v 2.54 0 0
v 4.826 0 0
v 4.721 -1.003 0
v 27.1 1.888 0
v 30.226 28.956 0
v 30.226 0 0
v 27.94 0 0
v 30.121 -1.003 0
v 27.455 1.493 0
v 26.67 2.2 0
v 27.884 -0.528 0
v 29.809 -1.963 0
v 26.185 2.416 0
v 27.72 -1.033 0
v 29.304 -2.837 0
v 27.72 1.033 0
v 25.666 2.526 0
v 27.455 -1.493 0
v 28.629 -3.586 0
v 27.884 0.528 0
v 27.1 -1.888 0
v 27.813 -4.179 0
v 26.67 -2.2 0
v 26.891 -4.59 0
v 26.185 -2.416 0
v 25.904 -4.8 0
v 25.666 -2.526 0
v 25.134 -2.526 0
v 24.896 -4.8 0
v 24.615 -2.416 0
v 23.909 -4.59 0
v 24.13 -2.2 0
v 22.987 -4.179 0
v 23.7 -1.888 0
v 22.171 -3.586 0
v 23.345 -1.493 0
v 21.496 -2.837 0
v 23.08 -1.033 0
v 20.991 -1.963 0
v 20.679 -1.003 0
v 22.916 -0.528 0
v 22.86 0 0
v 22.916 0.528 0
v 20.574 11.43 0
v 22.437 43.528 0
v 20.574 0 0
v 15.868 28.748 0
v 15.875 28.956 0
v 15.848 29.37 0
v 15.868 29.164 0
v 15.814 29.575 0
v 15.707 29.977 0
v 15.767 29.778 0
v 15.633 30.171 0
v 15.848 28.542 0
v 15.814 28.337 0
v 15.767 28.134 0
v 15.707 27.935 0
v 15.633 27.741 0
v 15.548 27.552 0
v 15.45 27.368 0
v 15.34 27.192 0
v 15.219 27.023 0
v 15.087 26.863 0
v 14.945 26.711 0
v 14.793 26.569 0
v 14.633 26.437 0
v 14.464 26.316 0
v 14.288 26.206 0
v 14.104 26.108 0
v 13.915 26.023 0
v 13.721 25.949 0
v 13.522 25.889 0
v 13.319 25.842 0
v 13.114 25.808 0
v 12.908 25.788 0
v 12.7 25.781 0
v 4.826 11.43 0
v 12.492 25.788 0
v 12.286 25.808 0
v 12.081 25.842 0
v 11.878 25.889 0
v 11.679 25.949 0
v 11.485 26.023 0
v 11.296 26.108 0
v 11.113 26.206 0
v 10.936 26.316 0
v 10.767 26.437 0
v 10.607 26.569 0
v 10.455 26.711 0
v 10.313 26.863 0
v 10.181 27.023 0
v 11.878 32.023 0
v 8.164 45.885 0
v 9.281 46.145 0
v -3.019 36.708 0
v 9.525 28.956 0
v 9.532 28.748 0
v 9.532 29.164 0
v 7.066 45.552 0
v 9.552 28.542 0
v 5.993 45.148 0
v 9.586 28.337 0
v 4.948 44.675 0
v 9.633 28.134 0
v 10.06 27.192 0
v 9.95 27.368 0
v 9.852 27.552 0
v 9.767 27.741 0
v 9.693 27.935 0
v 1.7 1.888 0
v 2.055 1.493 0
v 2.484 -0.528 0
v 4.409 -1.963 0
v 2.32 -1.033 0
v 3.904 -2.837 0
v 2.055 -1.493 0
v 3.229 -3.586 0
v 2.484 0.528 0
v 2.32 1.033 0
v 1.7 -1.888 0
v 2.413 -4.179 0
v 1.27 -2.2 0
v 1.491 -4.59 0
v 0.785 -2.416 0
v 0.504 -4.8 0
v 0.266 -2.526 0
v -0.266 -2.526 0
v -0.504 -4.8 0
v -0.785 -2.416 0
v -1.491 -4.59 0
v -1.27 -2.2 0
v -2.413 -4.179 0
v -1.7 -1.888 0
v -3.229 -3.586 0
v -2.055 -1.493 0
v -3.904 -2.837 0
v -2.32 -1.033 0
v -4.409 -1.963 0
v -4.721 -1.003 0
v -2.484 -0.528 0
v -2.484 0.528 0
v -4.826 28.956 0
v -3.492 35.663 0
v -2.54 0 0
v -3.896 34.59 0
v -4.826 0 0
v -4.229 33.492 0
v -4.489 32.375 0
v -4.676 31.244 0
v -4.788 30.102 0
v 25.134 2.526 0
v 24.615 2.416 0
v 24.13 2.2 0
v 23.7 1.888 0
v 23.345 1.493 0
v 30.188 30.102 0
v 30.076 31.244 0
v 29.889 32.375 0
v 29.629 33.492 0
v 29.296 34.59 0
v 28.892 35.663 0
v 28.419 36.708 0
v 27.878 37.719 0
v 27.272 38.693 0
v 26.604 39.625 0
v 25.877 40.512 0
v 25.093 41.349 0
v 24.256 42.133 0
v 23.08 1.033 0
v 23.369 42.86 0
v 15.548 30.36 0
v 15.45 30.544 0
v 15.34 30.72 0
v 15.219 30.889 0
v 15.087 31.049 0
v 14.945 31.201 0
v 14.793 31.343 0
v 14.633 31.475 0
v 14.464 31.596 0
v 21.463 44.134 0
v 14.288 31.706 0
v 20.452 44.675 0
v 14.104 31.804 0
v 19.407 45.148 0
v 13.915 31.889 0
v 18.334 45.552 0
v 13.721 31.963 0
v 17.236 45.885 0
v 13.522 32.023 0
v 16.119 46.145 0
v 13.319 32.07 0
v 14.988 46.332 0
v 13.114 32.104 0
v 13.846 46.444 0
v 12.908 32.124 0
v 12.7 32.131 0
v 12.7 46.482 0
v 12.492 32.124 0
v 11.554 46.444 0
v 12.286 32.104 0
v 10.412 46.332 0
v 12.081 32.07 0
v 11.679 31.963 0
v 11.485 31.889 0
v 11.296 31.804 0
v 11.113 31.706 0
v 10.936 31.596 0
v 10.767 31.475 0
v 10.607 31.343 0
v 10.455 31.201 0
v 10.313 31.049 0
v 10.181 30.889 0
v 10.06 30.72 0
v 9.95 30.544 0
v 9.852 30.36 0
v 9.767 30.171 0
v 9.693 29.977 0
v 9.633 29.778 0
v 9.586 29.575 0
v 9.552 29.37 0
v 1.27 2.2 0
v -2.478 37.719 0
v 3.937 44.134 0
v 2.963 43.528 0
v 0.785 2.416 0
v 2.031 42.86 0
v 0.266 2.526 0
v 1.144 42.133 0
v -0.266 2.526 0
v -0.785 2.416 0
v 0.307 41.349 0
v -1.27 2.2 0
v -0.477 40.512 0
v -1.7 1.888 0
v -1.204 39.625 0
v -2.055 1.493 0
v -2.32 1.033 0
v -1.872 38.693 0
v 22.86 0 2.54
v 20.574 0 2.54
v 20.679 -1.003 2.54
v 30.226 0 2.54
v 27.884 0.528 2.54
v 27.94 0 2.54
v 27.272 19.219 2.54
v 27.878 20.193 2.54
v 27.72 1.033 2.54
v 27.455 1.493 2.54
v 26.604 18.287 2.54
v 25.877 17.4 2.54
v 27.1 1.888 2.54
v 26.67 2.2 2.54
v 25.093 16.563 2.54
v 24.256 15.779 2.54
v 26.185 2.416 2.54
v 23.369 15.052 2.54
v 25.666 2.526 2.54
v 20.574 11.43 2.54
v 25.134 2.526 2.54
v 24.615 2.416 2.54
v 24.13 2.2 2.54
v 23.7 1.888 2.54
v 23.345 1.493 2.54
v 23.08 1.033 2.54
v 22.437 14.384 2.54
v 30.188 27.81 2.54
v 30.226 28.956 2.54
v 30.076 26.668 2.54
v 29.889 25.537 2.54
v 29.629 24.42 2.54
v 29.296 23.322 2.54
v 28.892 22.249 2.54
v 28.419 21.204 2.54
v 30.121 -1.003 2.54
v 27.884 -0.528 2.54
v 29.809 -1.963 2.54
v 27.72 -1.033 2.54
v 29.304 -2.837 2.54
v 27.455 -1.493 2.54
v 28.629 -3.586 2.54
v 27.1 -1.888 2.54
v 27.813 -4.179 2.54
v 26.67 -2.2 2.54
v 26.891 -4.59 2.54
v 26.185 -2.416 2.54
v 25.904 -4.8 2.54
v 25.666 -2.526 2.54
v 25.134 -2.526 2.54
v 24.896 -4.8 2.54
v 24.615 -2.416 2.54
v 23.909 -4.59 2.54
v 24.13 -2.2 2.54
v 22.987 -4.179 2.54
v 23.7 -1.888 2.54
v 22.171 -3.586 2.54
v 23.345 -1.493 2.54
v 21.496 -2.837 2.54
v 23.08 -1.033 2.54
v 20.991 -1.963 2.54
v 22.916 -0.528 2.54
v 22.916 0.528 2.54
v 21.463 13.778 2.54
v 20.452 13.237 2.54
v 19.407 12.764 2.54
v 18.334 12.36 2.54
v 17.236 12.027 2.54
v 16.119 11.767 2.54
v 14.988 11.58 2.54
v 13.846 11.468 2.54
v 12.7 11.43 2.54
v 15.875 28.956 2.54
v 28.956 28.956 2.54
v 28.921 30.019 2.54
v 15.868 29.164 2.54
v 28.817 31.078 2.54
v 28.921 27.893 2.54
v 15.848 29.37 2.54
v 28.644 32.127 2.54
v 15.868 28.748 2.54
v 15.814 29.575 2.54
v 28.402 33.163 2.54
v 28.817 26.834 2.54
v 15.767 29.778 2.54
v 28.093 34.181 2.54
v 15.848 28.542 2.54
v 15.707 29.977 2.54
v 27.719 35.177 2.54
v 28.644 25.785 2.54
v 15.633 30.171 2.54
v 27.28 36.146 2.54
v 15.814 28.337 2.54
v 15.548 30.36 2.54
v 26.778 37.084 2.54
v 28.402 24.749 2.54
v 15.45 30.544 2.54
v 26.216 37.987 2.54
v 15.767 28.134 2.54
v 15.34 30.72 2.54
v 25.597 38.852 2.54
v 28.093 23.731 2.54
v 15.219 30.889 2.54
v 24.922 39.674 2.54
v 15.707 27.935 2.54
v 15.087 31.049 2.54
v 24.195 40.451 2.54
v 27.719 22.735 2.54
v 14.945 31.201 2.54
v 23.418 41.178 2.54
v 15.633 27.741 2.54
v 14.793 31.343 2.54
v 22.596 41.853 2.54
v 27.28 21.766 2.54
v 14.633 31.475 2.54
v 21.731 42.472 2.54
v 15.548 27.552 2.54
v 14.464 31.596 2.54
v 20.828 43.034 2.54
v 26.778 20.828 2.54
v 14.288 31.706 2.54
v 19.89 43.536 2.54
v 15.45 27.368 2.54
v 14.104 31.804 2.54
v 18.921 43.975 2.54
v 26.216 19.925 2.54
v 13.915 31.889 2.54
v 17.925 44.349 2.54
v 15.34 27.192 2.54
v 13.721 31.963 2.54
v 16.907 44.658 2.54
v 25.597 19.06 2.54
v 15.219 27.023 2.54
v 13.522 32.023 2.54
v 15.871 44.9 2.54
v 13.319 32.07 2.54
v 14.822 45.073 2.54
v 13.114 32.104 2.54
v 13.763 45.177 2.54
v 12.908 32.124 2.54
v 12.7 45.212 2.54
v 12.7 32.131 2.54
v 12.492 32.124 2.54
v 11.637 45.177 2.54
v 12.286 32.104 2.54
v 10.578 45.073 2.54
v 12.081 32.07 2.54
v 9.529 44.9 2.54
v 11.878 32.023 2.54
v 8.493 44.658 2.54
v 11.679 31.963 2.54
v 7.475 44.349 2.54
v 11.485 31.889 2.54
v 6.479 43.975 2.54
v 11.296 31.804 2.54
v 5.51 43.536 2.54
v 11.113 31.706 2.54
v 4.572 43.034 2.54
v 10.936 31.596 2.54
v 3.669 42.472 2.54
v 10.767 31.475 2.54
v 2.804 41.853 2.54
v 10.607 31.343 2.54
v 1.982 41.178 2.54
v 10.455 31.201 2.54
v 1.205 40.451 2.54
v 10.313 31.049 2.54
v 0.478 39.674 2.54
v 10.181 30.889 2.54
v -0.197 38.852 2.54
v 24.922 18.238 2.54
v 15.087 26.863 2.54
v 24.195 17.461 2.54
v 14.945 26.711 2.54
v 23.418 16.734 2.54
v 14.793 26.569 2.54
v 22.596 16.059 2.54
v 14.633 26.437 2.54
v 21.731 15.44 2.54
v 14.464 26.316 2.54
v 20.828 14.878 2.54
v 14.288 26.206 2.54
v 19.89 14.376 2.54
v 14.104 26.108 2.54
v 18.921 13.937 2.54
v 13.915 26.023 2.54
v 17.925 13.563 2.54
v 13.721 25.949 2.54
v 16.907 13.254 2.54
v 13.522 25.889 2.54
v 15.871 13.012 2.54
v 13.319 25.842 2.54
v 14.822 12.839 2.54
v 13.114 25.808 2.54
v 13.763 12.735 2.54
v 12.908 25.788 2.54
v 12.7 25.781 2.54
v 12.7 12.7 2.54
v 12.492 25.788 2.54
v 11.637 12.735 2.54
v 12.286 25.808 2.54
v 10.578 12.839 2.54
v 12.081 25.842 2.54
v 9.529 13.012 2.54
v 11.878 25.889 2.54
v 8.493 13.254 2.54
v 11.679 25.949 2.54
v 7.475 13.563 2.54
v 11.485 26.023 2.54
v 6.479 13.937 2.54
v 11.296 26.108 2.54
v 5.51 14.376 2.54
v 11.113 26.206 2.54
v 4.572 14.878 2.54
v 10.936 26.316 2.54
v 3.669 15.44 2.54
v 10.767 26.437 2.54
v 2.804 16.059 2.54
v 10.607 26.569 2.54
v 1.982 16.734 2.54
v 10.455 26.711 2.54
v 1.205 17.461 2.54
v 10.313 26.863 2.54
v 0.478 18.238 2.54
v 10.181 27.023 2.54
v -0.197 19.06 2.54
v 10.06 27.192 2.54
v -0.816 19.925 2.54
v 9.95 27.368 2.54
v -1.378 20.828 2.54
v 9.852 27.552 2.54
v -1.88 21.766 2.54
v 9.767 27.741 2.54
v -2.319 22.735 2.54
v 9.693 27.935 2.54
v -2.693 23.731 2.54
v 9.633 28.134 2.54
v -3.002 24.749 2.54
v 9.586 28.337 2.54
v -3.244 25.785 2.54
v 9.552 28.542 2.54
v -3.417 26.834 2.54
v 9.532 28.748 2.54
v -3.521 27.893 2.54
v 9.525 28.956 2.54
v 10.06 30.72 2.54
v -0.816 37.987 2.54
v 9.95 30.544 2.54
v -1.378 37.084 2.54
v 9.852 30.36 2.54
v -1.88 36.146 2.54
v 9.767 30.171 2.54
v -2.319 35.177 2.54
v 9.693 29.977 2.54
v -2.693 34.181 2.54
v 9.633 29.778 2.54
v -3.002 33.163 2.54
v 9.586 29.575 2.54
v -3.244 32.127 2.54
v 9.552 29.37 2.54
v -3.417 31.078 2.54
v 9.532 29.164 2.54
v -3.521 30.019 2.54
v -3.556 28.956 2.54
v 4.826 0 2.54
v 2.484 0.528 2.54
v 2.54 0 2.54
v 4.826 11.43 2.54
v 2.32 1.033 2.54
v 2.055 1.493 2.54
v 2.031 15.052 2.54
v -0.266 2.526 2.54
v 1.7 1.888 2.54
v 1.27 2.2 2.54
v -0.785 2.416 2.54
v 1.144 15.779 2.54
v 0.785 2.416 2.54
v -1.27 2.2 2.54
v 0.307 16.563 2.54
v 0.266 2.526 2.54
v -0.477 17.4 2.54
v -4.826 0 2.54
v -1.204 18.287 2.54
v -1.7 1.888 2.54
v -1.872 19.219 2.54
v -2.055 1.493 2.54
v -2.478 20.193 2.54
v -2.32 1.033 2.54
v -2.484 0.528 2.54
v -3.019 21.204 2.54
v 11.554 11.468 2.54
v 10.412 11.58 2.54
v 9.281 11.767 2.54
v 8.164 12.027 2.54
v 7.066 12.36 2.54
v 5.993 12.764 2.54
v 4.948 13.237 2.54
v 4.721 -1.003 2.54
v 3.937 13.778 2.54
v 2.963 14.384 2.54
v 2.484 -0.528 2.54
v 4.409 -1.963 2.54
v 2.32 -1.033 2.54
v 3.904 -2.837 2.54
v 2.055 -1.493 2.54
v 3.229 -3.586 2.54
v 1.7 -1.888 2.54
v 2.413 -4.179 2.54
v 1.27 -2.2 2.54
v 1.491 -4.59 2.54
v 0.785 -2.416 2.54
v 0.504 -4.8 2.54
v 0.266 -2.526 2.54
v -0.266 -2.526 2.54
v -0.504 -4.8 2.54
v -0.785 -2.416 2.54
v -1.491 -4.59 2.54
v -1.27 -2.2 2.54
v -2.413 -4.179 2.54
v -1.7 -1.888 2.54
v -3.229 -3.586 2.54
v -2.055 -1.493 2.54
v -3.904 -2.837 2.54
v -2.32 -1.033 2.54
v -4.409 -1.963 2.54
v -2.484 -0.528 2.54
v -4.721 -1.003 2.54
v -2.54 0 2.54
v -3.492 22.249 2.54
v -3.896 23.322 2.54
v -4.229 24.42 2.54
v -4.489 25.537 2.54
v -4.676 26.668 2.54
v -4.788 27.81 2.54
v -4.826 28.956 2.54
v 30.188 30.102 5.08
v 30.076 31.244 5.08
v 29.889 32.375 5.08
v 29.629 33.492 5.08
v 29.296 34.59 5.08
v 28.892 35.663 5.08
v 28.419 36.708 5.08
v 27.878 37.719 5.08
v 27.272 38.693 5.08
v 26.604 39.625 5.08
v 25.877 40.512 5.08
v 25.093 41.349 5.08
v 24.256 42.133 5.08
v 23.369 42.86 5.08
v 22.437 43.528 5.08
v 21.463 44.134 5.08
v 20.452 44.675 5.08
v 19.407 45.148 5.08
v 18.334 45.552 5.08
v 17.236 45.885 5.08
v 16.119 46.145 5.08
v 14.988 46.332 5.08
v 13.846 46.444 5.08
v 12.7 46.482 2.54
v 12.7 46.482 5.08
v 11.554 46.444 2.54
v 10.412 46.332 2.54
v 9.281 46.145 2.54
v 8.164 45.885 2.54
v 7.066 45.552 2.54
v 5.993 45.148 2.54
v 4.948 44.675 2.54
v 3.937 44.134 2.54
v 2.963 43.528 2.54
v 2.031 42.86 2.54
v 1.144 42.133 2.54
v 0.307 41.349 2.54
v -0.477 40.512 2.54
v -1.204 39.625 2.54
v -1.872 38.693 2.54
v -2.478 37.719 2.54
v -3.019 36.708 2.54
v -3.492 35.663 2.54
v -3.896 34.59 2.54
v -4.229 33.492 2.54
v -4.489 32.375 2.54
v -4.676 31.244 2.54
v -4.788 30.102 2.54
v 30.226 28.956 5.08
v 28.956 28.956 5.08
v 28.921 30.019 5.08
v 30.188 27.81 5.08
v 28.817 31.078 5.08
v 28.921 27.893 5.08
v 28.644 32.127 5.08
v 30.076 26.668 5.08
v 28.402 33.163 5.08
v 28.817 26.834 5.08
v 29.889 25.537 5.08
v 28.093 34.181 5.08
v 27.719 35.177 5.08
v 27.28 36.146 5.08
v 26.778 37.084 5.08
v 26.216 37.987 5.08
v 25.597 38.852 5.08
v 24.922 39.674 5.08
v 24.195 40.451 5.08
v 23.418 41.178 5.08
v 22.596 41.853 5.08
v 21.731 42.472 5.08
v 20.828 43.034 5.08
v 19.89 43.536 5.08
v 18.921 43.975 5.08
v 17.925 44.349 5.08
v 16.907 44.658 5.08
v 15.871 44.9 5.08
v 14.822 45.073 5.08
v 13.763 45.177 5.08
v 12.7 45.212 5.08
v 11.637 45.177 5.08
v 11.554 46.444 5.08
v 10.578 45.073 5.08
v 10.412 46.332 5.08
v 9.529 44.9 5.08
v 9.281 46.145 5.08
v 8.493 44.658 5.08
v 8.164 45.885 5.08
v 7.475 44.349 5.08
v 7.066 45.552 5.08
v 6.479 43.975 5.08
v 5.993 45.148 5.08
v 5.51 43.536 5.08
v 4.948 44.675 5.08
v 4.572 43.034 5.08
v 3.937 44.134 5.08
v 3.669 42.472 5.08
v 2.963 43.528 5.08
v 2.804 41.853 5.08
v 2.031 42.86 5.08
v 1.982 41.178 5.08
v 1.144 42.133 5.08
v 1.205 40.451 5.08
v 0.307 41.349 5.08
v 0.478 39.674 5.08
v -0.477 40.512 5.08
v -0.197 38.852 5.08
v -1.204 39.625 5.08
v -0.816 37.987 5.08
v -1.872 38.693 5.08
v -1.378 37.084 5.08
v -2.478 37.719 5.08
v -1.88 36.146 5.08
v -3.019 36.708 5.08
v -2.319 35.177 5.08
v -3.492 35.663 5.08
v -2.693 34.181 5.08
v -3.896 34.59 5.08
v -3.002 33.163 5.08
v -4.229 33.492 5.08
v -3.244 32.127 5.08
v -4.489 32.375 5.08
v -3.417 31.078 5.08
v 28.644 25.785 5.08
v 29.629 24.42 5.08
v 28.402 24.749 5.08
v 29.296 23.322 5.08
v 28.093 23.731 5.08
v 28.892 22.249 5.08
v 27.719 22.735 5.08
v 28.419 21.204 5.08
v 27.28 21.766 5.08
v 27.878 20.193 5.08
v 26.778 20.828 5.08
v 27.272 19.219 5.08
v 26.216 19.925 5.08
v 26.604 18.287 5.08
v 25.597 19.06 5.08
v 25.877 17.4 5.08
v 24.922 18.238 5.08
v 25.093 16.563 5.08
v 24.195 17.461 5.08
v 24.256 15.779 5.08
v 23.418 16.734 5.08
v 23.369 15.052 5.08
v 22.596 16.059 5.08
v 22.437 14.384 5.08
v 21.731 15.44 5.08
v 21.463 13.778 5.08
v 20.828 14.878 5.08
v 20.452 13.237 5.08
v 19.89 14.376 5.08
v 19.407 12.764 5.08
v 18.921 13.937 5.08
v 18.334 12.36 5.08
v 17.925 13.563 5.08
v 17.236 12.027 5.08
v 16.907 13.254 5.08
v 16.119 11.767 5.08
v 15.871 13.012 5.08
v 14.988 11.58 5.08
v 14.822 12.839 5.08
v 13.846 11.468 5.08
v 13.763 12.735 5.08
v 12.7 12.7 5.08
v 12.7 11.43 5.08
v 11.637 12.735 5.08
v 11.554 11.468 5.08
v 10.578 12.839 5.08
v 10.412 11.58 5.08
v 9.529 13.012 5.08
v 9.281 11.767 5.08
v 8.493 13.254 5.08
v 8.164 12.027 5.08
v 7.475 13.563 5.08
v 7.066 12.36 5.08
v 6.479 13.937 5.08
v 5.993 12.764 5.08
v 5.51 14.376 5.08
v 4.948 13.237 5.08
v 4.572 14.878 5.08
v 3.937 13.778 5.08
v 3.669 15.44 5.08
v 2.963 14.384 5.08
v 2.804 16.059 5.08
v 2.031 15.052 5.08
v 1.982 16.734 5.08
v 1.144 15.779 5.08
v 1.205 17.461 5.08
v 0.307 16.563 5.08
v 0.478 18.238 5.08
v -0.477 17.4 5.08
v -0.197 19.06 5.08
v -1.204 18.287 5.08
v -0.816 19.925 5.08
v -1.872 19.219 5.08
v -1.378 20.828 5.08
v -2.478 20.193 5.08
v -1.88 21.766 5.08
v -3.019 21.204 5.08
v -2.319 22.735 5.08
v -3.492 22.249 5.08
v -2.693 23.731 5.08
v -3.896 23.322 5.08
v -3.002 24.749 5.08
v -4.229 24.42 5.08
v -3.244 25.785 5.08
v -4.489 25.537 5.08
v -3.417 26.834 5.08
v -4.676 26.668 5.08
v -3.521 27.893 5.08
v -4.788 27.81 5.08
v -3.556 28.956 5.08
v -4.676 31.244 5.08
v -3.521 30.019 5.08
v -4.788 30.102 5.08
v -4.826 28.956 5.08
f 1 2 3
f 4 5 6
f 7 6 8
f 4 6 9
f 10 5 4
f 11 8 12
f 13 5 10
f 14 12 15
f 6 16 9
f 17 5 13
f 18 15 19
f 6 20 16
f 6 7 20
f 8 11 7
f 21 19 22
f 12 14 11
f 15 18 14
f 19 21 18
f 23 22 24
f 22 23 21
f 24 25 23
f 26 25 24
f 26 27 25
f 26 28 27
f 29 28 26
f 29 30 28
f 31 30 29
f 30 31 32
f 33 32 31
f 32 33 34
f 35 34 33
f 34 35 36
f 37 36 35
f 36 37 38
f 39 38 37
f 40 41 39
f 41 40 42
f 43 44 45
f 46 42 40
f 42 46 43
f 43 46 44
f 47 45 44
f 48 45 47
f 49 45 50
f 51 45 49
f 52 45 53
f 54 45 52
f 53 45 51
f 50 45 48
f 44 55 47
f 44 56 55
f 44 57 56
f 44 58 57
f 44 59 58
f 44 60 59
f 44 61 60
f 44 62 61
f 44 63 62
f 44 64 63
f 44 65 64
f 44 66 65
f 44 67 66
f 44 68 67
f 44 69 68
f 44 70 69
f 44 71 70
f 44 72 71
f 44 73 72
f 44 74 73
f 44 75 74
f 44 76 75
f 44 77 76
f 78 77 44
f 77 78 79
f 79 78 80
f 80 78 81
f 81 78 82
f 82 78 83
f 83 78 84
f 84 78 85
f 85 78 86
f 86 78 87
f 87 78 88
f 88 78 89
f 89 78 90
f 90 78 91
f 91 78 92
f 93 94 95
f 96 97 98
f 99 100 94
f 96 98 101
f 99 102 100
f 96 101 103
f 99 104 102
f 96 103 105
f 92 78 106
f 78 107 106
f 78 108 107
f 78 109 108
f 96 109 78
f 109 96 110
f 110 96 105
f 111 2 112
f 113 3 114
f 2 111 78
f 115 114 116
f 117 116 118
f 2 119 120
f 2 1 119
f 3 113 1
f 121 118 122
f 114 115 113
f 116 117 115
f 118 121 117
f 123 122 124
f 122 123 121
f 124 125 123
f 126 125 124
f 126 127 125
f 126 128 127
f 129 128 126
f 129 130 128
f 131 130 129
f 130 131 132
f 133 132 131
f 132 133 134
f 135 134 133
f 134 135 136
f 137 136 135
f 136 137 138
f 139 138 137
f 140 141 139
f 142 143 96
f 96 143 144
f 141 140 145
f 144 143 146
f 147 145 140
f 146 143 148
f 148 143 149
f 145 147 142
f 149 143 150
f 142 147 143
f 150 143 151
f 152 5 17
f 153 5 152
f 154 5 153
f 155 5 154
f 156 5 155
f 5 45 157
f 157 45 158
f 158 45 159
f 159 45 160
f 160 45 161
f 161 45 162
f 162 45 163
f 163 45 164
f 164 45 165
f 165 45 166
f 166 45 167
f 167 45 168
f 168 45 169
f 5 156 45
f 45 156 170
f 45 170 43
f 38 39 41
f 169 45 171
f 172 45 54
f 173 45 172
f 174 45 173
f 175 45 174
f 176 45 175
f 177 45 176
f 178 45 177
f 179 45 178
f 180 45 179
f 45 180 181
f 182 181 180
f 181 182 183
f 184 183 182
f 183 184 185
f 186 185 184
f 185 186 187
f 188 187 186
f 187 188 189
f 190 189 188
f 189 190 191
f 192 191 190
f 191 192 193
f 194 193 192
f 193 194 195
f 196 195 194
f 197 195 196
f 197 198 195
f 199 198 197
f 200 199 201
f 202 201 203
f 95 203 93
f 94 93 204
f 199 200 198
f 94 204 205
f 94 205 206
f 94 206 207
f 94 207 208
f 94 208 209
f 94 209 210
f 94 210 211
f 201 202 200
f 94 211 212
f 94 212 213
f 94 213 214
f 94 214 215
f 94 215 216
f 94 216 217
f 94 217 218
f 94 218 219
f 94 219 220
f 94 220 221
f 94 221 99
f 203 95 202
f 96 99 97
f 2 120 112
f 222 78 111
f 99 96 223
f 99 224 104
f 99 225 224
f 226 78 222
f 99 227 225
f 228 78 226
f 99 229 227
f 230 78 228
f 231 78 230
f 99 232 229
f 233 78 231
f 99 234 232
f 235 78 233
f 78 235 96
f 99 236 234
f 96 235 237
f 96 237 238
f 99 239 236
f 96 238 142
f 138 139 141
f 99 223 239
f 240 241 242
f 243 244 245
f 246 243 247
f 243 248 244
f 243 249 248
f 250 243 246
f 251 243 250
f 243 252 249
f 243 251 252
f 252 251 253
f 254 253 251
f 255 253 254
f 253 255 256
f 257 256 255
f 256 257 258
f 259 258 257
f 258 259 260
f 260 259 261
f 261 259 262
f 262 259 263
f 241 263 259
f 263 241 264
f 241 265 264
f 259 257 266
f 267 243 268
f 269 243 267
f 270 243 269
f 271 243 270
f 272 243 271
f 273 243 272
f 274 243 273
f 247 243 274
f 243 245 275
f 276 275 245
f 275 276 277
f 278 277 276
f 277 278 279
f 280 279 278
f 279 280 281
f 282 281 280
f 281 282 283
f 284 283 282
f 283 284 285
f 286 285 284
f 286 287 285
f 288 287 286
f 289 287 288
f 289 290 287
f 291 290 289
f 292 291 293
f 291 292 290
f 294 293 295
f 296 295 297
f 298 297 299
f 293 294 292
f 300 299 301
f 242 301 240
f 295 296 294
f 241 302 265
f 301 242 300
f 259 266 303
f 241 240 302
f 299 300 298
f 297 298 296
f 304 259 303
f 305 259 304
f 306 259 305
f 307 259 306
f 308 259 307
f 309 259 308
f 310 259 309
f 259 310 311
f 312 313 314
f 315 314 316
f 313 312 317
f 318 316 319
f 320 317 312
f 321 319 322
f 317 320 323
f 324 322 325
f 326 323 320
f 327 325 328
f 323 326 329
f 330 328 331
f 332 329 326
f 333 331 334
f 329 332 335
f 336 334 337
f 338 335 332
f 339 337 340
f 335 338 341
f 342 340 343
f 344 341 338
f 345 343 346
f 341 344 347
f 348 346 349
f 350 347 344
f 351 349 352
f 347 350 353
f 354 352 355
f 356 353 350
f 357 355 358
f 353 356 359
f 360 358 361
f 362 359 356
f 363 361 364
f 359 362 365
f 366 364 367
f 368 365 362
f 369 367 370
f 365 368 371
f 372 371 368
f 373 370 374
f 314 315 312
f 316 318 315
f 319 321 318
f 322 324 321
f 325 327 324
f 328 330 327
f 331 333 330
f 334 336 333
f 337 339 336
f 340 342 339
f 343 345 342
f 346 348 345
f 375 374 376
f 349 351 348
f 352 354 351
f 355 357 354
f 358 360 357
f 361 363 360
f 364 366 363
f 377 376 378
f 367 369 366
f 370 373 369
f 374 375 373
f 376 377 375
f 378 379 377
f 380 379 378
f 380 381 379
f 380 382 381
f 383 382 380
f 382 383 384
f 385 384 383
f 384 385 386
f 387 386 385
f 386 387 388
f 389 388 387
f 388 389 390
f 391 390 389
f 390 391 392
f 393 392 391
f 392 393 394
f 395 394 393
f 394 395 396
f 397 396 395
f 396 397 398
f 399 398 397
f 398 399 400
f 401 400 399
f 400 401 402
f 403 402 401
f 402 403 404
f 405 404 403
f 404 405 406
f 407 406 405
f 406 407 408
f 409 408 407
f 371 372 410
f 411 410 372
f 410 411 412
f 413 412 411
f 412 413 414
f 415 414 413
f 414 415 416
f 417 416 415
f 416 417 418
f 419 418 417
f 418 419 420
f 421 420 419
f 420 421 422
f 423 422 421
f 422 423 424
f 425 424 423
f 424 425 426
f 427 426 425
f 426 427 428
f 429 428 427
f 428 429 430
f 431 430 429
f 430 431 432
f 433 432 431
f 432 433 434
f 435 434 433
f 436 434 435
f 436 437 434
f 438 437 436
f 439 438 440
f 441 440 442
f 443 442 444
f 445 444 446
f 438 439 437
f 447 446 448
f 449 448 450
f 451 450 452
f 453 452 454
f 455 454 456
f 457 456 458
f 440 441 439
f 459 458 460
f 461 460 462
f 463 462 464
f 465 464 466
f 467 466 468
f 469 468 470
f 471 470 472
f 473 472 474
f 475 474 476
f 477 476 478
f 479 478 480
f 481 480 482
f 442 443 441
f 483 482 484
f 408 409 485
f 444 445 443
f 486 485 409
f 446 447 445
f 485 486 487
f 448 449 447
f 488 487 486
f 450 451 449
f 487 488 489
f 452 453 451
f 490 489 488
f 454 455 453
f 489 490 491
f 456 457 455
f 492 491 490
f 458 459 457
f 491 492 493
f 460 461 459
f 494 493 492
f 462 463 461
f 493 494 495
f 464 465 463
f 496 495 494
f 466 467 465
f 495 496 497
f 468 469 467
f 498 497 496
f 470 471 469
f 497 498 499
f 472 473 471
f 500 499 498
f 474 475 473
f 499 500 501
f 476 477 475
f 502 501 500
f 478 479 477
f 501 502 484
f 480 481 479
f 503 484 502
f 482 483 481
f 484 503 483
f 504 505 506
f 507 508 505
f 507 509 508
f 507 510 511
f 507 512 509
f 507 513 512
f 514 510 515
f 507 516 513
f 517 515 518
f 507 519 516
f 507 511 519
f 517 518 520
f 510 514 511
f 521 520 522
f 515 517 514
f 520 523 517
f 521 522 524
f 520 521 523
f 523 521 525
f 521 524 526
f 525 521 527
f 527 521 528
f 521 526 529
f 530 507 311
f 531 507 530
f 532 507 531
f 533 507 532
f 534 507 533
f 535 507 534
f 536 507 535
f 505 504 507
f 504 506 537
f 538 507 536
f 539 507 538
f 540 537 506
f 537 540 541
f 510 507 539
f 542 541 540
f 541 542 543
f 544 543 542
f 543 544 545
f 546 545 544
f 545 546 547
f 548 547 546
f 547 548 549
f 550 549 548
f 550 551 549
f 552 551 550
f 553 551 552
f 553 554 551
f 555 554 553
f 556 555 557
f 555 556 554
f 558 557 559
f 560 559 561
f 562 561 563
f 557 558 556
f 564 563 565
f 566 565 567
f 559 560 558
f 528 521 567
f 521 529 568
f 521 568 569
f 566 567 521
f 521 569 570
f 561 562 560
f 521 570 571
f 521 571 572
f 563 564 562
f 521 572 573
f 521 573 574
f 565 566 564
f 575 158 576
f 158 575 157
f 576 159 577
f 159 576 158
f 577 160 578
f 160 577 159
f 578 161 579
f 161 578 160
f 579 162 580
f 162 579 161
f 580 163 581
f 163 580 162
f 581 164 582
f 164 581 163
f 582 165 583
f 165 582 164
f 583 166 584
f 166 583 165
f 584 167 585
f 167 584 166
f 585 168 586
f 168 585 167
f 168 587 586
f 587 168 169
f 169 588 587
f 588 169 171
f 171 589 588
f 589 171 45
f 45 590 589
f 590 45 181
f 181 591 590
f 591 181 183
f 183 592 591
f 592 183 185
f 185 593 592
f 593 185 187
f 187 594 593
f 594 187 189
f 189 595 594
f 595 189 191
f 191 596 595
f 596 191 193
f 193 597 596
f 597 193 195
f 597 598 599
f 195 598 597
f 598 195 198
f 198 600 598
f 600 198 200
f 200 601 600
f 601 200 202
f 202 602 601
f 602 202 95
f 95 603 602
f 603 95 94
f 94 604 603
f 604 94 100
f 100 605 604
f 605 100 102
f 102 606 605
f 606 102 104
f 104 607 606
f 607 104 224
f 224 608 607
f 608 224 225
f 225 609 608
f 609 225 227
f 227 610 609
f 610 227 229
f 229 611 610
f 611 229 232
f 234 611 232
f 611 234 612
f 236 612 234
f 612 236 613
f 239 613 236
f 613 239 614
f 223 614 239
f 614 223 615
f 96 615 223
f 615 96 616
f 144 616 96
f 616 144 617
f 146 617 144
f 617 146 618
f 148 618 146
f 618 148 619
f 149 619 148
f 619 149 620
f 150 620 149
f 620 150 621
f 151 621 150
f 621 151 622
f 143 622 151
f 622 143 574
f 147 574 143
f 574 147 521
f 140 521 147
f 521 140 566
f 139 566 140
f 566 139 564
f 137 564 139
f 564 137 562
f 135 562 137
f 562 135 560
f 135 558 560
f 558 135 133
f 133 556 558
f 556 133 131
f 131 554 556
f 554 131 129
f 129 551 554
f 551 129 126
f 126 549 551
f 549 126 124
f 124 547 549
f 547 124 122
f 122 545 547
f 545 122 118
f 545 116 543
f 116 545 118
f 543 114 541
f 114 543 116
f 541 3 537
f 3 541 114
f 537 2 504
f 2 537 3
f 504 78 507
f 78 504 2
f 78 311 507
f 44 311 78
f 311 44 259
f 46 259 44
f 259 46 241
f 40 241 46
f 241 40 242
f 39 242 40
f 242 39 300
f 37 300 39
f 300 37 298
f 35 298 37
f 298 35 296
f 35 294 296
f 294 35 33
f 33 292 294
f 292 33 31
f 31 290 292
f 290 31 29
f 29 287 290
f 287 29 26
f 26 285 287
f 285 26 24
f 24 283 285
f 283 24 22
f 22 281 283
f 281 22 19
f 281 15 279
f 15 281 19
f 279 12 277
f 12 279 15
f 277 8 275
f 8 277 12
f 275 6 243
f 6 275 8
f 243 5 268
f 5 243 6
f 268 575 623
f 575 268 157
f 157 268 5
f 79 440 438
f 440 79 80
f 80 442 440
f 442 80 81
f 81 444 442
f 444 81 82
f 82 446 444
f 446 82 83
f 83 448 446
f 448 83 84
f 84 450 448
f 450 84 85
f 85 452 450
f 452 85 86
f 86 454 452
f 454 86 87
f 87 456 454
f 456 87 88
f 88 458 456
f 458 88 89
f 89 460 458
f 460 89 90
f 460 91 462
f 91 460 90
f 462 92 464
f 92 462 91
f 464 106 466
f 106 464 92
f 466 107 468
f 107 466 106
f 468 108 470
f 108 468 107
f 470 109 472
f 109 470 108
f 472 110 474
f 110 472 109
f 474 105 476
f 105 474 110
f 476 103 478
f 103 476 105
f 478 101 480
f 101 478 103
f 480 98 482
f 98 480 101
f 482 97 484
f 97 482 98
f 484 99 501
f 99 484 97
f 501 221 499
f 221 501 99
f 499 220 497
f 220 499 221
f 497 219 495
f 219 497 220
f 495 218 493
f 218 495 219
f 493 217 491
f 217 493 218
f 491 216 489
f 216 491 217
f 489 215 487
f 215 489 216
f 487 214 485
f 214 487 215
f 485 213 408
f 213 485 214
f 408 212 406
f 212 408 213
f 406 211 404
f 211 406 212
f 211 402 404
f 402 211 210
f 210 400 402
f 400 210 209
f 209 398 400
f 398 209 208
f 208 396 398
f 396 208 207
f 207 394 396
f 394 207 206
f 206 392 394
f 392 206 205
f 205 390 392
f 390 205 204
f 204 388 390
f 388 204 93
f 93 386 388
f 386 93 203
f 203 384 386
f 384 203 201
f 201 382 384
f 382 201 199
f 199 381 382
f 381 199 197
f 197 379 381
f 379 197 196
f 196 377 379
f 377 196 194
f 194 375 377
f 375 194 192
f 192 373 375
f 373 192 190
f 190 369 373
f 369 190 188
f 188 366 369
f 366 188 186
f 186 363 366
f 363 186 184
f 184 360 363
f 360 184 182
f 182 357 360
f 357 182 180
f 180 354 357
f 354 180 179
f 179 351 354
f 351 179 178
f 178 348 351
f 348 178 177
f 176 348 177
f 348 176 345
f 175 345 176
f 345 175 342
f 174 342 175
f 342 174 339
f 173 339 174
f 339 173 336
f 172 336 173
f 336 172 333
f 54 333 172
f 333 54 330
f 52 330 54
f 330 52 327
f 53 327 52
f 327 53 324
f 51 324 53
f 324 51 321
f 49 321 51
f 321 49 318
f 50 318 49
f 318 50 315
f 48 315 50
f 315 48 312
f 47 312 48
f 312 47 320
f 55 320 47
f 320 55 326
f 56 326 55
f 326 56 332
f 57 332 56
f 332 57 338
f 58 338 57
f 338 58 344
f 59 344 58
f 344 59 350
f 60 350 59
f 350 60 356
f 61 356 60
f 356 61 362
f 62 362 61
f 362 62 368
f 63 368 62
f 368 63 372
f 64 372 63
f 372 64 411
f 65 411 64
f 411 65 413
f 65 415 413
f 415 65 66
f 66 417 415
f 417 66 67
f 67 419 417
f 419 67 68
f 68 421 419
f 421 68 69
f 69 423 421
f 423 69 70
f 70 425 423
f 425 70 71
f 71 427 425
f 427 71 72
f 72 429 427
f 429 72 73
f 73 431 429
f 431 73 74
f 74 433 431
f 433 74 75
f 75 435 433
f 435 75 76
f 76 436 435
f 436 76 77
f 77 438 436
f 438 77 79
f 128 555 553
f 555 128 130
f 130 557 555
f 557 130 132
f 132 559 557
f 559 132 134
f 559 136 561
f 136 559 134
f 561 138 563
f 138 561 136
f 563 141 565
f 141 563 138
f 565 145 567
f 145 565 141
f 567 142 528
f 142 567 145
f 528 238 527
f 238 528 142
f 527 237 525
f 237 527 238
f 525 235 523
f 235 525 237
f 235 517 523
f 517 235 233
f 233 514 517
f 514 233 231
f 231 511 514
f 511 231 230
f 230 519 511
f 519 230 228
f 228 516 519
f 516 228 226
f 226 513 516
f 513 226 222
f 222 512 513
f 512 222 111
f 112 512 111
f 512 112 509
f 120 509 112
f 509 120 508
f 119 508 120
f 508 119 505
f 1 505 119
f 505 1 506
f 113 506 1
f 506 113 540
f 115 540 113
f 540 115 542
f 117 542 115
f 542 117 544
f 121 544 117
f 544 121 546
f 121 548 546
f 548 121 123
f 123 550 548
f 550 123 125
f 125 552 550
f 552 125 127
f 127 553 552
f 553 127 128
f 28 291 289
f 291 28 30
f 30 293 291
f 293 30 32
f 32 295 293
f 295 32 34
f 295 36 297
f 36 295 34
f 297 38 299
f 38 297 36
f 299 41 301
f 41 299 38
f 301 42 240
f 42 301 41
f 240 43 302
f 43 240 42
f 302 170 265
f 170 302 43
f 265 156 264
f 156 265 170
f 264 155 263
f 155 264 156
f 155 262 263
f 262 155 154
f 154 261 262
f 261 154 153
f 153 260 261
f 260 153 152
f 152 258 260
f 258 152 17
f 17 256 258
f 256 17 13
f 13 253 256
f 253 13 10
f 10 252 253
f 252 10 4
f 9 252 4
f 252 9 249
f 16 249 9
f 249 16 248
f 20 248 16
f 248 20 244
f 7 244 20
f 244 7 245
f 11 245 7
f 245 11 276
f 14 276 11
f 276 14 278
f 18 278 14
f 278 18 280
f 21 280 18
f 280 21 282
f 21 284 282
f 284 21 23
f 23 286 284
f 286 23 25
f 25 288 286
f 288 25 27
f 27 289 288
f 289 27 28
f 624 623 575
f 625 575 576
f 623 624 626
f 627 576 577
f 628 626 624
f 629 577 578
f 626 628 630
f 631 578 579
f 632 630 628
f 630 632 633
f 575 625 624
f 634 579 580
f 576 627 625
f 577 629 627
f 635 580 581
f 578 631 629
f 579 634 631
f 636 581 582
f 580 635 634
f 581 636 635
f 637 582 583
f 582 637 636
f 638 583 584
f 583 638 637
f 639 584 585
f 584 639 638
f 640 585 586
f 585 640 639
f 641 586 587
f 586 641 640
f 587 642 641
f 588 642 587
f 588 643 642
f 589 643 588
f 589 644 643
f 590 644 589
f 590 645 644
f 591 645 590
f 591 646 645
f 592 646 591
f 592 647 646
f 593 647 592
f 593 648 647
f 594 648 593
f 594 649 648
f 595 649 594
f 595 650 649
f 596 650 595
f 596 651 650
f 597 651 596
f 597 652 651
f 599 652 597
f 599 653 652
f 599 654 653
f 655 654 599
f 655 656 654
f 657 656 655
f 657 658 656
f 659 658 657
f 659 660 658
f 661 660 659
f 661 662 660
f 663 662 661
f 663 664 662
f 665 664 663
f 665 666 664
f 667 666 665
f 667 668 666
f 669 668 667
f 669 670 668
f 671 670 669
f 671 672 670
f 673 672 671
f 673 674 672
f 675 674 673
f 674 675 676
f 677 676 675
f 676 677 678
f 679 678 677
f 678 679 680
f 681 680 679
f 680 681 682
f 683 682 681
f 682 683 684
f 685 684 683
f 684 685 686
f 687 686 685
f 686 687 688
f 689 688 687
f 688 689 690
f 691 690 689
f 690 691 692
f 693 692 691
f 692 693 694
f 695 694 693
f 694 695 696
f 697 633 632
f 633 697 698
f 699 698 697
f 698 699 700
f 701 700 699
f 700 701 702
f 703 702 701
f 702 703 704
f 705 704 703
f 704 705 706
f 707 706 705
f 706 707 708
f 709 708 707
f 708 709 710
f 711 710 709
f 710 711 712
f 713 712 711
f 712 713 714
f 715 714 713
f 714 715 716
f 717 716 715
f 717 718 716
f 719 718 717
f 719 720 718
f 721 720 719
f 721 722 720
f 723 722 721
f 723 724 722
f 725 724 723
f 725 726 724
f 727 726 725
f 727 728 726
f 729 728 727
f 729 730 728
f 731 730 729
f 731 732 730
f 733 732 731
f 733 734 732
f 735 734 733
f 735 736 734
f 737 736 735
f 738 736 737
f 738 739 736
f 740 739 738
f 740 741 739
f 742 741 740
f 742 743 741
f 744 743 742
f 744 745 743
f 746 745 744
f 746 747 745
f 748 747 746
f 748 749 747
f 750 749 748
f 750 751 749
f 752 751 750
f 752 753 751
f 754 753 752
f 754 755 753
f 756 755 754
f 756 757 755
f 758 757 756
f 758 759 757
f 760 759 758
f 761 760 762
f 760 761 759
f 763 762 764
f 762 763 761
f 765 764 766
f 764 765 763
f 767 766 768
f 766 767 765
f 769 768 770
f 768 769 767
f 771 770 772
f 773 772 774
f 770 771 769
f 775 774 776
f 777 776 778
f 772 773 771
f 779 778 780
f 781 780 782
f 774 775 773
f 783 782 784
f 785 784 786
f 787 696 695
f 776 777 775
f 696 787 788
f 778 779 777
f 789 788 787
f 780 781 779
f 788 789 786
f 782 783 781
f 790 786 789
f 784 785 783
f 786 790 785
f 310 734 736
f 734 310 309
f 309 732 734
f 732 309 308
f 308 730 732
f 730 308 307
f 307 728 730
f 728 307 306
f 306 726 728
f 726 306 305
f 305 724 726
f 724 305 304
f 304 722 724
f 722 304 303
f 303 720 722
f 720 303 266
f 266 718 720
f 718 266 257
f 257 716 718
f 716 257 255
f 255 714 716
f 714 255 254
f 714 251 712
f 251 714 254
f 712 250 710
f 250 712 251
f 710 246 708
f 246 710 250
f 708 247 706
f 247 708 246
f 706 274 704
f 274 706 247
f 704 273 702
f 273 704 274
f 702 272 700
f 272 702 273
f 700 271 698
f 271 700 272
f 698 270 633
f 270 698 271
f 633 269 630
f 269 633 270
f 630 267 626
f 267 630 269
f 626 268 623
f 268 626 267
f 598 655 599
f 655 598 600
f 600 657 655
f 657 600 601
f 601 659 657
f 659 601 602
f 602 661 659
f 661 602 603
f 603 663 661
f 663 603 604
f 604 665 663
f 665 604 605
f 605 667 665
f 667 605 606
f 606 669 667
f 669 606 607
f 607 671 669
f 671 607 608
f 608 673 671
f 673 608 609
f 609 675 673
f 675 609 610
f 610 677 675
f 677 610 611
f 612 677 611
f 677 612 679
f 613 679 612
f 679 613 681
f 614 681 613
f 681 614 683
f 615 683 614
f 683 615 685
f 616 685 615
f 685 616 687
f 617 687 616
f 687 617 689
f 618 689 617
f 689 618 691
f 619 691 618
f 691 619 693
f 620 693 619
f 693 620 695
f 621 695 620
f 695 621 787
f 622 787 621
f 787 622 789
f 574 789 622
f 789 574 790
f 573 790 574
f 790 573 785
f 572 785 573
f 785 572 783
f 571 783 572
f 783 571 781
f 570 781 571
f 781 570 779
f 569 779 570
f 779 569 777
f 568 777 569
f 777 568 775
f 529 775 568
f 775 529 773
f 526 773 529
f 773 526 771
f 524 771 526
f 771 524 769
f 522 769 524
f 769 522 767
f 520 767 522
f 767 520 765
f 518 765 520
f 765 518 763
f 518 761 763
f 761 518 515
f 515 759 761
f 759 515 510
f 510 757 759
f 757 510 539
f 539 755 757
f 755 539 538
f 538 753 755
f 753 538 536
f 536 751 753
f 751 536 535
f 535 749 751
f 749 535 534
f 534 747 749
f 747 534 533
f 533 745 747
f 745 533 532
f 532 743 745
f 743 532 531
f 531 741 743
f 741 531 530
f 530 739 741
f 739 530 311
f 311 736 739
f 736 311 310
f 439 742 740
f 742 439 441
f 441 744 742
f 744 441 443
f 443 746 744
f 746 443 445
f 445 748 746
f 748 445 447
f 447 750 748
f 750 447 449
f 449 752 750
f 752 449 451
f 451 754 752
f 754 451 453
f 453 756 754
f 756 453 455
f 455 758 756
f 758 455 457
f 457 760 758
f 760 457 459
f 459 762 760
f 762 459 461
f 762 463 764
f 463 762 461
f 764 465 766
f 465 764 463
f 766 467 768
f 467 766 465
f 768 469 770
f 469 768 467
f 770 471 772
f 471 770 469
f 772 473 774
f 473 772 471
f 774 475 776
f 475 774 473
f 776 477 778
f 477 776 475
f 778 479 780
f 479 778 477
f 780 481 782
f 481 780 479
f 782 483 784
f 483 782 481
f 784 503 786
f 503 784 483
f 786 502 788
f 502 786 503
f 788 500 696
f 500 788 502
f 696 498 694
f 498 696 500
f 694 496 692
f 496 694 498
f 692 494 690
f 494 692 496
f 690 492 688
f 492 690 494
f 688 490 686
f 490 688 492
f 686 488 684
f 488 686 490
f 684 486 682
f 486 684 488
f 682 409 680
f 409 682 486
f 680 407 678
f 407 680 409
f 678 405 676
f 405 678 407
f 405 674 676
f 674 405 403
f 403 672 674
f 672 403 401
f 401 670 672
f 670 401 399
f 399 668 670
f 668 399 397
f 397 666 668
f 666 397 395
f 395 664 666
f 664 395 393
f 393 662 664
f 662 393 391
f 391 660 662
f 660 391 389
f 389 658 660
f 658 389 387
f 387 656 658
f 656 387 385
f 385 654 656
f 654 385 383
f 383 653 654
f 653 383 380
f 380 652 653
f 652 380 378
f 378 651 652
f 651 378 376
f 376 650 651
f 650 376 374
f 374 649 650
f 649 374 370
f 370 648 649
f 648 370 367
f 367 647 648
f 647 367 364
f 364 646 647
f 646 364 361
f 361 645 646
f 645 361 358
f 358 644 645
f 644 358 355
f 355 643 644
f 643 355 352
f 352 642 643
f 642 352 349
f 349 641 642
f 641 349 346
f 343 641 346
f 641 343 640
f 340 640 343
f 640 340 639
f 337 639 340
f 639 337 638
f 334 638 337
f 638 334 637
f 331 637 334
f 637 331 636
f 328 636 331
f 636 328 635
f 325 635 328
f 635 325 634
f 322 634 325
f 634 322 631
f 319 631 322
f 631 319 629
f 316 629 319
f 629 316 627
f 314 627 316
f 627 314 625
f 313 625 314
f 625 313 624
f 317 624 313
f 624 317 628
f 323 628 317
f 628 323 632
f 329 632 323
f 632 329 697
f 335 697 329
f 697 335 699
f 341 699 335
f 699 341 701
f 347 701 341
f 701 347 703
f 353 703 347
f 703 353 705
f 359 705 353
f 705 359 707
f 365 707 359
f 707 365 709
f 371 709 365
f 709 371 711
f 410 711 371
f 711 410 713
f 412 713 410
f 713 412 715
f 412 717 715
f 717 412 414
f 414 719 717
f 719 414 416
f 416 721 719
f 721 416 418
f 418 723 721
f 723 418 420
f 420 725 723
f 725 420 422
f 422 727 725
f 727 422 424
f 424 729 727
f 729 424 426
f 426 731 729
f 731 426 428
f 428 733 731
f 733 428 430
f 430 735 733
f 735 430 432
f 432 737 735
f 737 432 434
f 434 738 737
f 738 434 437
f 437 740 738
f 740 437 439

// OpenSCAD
ViewScale = [0.0254, 0.0254, 0.0254];

module cutouts()
{
   difference() {
        circle(1600/2, $fn=96);
        circle(1490/2, $fn=96);
        // tab
        translate([0, 700, 0])
        square([400, 200], center=true);
        // tab
        rotate([0, 0, 120]) 
        translate([0, 700, 0])
        square([400, 200], center=true);
        // tab
        rotate([0, 0, 240]) 
        translate([0, 700, 0])
        square([400, 200], center=true);
    }
}

//module rotcutouts() {
//    for(ii=[0:90:360]) {
//        rotate([0, 0, ii])
//        translate([0, 500, 0])
//        square([400, 200], center=true);
//    }
//}

module bodymain()
{
    difference() {
        circle(1600/2, $fn=96);
        circle(1400/2, $fn=96);
    }
}

//module bodycutout()
//{
//    difference() {
//        circle(1460/2, $fn=96);
//        circle(1360/2, $fn=96);
//        *square([1020, 1020], center=true);
//        translate([0, 700, 0])
//        square([400, 200], center=true);
//        scale([1.3,1.3,1.3])
//        translate([0, 500, 0])
//        square([400, 200], center=true);
//        //rotcutouts();
//    }
//}

module bodycutout2()
{
    difference() {
        circle(1460/2, $fn=96);
        circle(1360/2, $fn=96);
        scale([1.3,1.3,1.3])
        translate([0, 500, 0])
        square([400, 200], center=true);
        //rotcutouts();
    }
}

//module ledframe2()
//{
//    difference() {
//    square([1030, 1030], center=true);
//    square([800, 800], center=true);
//    rotcutouts();
////    translate([0, 500, 0])
////    square([400, 200], center=true);
//    }
//}
//
//module ledframe1()
//{
//    difference() {
//        square([1030, 1030], center=true);
//        square([900, 900], center=true);
//        rotcutouts();
//    }
//}

//module support()
//{
//    difference() {
//    square([860, 860], center=true);
//    square([760, 760], center=true);
//    }
//}

module mirror()
{
    translate([-525/2, 0, 500])
    rotate([135, 0, 0]) {
        translate([-10, 0, -500]) {
        linear_extrude(1000)
        difference() {
            square([545, 164]);
            translate([94/2, 0, 0])
            square([445, 114]);
        }
        translate([0, 0, 1000])
        linear_extrude(50)
        square([525, 164]);
    }}
}

module cap() 
{
    difference() {
        circle(1600/2, $fn=96);
        square([455, 870], center=true);
    }
}

module vexmount1()
{
    difference() {
        hull() {
            circle(380/2);
            translate([0, 300, 0])
            square([380, 380], center=true);
        }
        circle(200/2);
    }
}


module vexmount()
{
    linear_extrude(100) {
        vexmount1();
        translate([1000, 0, 0])
        vexmount1();
        translate([-380/2, 450, 0]) {
            difference() {
                union() {
                    square([1380, 1380/2]);
                    translate([1380/2, 1380/2, 0]) 
                    circle(1380/2, $fn=96);
                }
                translate([1380/2, 1380/2, 0]) 
                circle(250/2, $fn=96);
            }
        }
    }
    translate([1380/2-380/2, 1380/2+450, 100]) 
    linear_extrude(100)
    difference(){
        circle(1380/2, $fn=96);
        circle(1280/2, $fn=96);
    }

}

module mountsupport()
{
    square([700, 100], center=true);
}

scale(ViewScale)
{
//    #linear_extrude(200){
//        ledframe1();
//        bodycutout();
//    }
//    #linear_extrude(170)
//    support();
//
//    #translate([0, 0, 200])
//    linear_extrude(200)
//    bodycutout2();
//
//    #translate([0, 0, 200])
//    linear_extrude(200)
//    ledframe2();

//    translate([0, 0, 0])
//    linear_extrude(300)
//    cutouts();
//
//    translate([0, 0, 300])
//    linear_extrude(200)
//    bodymain();

//    translate([0, 0, 500])
//    linear_extrude(50)
//    cap();

//    translate([0, 0, 300])
//    mirror();
//
//    translate([-500, 690, 1190])
//    rotate([-90, 0, 0])
    vexmount();

//    translate([0, 790, 300])
//    linear_extrude(250)
//    mountsupport();

}
